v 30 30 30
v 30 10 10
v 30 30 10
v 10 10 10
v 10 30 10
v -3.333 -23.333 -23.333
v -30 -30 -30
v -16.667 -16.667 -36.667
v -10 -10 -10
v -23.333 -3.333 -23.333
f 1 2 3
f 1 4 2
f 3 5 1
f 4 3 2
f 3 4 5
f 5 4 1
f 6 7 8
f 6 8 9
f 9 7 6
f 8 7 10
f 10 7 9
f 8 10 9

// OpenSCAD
// Unit of length: Unit.MM
union()
{
   translate(v = [10.0, 10.0, 10.0])
   {
      polyhedron(points = [[20.0, 20.0, 0.0], [20.0, 0.0, 0.0], [20.0, 20.0, 20.0], [0.0, 0.0, 0.0], [0.0, 20.0, 0.0]], faces = [[0, 1, 2], [1, 3, 2], [3, 4, 2], [4, 0, 2], [1, 0, 4], [3, 1, 4]]);
   }
   mirror(v = [0.5774, 0.5774, 0.5774])
   {
      translate(v = [10.0, 10.0, 10.0])
      {
         polyhedron(points = [[20.0, 20.0, 0.0], [20.0, 0.0, 0.0], [20.0, 20.0, 20.0], [0.0, 0.0, 0.0], [0.0, 20.0, 0.0]], faces = [[0, 1, 2], [1, 3, 2], [3, 4, 2], [4, 0, 2], [1, 0, 4], [3, 1, 4]]);
      }
   }
}
